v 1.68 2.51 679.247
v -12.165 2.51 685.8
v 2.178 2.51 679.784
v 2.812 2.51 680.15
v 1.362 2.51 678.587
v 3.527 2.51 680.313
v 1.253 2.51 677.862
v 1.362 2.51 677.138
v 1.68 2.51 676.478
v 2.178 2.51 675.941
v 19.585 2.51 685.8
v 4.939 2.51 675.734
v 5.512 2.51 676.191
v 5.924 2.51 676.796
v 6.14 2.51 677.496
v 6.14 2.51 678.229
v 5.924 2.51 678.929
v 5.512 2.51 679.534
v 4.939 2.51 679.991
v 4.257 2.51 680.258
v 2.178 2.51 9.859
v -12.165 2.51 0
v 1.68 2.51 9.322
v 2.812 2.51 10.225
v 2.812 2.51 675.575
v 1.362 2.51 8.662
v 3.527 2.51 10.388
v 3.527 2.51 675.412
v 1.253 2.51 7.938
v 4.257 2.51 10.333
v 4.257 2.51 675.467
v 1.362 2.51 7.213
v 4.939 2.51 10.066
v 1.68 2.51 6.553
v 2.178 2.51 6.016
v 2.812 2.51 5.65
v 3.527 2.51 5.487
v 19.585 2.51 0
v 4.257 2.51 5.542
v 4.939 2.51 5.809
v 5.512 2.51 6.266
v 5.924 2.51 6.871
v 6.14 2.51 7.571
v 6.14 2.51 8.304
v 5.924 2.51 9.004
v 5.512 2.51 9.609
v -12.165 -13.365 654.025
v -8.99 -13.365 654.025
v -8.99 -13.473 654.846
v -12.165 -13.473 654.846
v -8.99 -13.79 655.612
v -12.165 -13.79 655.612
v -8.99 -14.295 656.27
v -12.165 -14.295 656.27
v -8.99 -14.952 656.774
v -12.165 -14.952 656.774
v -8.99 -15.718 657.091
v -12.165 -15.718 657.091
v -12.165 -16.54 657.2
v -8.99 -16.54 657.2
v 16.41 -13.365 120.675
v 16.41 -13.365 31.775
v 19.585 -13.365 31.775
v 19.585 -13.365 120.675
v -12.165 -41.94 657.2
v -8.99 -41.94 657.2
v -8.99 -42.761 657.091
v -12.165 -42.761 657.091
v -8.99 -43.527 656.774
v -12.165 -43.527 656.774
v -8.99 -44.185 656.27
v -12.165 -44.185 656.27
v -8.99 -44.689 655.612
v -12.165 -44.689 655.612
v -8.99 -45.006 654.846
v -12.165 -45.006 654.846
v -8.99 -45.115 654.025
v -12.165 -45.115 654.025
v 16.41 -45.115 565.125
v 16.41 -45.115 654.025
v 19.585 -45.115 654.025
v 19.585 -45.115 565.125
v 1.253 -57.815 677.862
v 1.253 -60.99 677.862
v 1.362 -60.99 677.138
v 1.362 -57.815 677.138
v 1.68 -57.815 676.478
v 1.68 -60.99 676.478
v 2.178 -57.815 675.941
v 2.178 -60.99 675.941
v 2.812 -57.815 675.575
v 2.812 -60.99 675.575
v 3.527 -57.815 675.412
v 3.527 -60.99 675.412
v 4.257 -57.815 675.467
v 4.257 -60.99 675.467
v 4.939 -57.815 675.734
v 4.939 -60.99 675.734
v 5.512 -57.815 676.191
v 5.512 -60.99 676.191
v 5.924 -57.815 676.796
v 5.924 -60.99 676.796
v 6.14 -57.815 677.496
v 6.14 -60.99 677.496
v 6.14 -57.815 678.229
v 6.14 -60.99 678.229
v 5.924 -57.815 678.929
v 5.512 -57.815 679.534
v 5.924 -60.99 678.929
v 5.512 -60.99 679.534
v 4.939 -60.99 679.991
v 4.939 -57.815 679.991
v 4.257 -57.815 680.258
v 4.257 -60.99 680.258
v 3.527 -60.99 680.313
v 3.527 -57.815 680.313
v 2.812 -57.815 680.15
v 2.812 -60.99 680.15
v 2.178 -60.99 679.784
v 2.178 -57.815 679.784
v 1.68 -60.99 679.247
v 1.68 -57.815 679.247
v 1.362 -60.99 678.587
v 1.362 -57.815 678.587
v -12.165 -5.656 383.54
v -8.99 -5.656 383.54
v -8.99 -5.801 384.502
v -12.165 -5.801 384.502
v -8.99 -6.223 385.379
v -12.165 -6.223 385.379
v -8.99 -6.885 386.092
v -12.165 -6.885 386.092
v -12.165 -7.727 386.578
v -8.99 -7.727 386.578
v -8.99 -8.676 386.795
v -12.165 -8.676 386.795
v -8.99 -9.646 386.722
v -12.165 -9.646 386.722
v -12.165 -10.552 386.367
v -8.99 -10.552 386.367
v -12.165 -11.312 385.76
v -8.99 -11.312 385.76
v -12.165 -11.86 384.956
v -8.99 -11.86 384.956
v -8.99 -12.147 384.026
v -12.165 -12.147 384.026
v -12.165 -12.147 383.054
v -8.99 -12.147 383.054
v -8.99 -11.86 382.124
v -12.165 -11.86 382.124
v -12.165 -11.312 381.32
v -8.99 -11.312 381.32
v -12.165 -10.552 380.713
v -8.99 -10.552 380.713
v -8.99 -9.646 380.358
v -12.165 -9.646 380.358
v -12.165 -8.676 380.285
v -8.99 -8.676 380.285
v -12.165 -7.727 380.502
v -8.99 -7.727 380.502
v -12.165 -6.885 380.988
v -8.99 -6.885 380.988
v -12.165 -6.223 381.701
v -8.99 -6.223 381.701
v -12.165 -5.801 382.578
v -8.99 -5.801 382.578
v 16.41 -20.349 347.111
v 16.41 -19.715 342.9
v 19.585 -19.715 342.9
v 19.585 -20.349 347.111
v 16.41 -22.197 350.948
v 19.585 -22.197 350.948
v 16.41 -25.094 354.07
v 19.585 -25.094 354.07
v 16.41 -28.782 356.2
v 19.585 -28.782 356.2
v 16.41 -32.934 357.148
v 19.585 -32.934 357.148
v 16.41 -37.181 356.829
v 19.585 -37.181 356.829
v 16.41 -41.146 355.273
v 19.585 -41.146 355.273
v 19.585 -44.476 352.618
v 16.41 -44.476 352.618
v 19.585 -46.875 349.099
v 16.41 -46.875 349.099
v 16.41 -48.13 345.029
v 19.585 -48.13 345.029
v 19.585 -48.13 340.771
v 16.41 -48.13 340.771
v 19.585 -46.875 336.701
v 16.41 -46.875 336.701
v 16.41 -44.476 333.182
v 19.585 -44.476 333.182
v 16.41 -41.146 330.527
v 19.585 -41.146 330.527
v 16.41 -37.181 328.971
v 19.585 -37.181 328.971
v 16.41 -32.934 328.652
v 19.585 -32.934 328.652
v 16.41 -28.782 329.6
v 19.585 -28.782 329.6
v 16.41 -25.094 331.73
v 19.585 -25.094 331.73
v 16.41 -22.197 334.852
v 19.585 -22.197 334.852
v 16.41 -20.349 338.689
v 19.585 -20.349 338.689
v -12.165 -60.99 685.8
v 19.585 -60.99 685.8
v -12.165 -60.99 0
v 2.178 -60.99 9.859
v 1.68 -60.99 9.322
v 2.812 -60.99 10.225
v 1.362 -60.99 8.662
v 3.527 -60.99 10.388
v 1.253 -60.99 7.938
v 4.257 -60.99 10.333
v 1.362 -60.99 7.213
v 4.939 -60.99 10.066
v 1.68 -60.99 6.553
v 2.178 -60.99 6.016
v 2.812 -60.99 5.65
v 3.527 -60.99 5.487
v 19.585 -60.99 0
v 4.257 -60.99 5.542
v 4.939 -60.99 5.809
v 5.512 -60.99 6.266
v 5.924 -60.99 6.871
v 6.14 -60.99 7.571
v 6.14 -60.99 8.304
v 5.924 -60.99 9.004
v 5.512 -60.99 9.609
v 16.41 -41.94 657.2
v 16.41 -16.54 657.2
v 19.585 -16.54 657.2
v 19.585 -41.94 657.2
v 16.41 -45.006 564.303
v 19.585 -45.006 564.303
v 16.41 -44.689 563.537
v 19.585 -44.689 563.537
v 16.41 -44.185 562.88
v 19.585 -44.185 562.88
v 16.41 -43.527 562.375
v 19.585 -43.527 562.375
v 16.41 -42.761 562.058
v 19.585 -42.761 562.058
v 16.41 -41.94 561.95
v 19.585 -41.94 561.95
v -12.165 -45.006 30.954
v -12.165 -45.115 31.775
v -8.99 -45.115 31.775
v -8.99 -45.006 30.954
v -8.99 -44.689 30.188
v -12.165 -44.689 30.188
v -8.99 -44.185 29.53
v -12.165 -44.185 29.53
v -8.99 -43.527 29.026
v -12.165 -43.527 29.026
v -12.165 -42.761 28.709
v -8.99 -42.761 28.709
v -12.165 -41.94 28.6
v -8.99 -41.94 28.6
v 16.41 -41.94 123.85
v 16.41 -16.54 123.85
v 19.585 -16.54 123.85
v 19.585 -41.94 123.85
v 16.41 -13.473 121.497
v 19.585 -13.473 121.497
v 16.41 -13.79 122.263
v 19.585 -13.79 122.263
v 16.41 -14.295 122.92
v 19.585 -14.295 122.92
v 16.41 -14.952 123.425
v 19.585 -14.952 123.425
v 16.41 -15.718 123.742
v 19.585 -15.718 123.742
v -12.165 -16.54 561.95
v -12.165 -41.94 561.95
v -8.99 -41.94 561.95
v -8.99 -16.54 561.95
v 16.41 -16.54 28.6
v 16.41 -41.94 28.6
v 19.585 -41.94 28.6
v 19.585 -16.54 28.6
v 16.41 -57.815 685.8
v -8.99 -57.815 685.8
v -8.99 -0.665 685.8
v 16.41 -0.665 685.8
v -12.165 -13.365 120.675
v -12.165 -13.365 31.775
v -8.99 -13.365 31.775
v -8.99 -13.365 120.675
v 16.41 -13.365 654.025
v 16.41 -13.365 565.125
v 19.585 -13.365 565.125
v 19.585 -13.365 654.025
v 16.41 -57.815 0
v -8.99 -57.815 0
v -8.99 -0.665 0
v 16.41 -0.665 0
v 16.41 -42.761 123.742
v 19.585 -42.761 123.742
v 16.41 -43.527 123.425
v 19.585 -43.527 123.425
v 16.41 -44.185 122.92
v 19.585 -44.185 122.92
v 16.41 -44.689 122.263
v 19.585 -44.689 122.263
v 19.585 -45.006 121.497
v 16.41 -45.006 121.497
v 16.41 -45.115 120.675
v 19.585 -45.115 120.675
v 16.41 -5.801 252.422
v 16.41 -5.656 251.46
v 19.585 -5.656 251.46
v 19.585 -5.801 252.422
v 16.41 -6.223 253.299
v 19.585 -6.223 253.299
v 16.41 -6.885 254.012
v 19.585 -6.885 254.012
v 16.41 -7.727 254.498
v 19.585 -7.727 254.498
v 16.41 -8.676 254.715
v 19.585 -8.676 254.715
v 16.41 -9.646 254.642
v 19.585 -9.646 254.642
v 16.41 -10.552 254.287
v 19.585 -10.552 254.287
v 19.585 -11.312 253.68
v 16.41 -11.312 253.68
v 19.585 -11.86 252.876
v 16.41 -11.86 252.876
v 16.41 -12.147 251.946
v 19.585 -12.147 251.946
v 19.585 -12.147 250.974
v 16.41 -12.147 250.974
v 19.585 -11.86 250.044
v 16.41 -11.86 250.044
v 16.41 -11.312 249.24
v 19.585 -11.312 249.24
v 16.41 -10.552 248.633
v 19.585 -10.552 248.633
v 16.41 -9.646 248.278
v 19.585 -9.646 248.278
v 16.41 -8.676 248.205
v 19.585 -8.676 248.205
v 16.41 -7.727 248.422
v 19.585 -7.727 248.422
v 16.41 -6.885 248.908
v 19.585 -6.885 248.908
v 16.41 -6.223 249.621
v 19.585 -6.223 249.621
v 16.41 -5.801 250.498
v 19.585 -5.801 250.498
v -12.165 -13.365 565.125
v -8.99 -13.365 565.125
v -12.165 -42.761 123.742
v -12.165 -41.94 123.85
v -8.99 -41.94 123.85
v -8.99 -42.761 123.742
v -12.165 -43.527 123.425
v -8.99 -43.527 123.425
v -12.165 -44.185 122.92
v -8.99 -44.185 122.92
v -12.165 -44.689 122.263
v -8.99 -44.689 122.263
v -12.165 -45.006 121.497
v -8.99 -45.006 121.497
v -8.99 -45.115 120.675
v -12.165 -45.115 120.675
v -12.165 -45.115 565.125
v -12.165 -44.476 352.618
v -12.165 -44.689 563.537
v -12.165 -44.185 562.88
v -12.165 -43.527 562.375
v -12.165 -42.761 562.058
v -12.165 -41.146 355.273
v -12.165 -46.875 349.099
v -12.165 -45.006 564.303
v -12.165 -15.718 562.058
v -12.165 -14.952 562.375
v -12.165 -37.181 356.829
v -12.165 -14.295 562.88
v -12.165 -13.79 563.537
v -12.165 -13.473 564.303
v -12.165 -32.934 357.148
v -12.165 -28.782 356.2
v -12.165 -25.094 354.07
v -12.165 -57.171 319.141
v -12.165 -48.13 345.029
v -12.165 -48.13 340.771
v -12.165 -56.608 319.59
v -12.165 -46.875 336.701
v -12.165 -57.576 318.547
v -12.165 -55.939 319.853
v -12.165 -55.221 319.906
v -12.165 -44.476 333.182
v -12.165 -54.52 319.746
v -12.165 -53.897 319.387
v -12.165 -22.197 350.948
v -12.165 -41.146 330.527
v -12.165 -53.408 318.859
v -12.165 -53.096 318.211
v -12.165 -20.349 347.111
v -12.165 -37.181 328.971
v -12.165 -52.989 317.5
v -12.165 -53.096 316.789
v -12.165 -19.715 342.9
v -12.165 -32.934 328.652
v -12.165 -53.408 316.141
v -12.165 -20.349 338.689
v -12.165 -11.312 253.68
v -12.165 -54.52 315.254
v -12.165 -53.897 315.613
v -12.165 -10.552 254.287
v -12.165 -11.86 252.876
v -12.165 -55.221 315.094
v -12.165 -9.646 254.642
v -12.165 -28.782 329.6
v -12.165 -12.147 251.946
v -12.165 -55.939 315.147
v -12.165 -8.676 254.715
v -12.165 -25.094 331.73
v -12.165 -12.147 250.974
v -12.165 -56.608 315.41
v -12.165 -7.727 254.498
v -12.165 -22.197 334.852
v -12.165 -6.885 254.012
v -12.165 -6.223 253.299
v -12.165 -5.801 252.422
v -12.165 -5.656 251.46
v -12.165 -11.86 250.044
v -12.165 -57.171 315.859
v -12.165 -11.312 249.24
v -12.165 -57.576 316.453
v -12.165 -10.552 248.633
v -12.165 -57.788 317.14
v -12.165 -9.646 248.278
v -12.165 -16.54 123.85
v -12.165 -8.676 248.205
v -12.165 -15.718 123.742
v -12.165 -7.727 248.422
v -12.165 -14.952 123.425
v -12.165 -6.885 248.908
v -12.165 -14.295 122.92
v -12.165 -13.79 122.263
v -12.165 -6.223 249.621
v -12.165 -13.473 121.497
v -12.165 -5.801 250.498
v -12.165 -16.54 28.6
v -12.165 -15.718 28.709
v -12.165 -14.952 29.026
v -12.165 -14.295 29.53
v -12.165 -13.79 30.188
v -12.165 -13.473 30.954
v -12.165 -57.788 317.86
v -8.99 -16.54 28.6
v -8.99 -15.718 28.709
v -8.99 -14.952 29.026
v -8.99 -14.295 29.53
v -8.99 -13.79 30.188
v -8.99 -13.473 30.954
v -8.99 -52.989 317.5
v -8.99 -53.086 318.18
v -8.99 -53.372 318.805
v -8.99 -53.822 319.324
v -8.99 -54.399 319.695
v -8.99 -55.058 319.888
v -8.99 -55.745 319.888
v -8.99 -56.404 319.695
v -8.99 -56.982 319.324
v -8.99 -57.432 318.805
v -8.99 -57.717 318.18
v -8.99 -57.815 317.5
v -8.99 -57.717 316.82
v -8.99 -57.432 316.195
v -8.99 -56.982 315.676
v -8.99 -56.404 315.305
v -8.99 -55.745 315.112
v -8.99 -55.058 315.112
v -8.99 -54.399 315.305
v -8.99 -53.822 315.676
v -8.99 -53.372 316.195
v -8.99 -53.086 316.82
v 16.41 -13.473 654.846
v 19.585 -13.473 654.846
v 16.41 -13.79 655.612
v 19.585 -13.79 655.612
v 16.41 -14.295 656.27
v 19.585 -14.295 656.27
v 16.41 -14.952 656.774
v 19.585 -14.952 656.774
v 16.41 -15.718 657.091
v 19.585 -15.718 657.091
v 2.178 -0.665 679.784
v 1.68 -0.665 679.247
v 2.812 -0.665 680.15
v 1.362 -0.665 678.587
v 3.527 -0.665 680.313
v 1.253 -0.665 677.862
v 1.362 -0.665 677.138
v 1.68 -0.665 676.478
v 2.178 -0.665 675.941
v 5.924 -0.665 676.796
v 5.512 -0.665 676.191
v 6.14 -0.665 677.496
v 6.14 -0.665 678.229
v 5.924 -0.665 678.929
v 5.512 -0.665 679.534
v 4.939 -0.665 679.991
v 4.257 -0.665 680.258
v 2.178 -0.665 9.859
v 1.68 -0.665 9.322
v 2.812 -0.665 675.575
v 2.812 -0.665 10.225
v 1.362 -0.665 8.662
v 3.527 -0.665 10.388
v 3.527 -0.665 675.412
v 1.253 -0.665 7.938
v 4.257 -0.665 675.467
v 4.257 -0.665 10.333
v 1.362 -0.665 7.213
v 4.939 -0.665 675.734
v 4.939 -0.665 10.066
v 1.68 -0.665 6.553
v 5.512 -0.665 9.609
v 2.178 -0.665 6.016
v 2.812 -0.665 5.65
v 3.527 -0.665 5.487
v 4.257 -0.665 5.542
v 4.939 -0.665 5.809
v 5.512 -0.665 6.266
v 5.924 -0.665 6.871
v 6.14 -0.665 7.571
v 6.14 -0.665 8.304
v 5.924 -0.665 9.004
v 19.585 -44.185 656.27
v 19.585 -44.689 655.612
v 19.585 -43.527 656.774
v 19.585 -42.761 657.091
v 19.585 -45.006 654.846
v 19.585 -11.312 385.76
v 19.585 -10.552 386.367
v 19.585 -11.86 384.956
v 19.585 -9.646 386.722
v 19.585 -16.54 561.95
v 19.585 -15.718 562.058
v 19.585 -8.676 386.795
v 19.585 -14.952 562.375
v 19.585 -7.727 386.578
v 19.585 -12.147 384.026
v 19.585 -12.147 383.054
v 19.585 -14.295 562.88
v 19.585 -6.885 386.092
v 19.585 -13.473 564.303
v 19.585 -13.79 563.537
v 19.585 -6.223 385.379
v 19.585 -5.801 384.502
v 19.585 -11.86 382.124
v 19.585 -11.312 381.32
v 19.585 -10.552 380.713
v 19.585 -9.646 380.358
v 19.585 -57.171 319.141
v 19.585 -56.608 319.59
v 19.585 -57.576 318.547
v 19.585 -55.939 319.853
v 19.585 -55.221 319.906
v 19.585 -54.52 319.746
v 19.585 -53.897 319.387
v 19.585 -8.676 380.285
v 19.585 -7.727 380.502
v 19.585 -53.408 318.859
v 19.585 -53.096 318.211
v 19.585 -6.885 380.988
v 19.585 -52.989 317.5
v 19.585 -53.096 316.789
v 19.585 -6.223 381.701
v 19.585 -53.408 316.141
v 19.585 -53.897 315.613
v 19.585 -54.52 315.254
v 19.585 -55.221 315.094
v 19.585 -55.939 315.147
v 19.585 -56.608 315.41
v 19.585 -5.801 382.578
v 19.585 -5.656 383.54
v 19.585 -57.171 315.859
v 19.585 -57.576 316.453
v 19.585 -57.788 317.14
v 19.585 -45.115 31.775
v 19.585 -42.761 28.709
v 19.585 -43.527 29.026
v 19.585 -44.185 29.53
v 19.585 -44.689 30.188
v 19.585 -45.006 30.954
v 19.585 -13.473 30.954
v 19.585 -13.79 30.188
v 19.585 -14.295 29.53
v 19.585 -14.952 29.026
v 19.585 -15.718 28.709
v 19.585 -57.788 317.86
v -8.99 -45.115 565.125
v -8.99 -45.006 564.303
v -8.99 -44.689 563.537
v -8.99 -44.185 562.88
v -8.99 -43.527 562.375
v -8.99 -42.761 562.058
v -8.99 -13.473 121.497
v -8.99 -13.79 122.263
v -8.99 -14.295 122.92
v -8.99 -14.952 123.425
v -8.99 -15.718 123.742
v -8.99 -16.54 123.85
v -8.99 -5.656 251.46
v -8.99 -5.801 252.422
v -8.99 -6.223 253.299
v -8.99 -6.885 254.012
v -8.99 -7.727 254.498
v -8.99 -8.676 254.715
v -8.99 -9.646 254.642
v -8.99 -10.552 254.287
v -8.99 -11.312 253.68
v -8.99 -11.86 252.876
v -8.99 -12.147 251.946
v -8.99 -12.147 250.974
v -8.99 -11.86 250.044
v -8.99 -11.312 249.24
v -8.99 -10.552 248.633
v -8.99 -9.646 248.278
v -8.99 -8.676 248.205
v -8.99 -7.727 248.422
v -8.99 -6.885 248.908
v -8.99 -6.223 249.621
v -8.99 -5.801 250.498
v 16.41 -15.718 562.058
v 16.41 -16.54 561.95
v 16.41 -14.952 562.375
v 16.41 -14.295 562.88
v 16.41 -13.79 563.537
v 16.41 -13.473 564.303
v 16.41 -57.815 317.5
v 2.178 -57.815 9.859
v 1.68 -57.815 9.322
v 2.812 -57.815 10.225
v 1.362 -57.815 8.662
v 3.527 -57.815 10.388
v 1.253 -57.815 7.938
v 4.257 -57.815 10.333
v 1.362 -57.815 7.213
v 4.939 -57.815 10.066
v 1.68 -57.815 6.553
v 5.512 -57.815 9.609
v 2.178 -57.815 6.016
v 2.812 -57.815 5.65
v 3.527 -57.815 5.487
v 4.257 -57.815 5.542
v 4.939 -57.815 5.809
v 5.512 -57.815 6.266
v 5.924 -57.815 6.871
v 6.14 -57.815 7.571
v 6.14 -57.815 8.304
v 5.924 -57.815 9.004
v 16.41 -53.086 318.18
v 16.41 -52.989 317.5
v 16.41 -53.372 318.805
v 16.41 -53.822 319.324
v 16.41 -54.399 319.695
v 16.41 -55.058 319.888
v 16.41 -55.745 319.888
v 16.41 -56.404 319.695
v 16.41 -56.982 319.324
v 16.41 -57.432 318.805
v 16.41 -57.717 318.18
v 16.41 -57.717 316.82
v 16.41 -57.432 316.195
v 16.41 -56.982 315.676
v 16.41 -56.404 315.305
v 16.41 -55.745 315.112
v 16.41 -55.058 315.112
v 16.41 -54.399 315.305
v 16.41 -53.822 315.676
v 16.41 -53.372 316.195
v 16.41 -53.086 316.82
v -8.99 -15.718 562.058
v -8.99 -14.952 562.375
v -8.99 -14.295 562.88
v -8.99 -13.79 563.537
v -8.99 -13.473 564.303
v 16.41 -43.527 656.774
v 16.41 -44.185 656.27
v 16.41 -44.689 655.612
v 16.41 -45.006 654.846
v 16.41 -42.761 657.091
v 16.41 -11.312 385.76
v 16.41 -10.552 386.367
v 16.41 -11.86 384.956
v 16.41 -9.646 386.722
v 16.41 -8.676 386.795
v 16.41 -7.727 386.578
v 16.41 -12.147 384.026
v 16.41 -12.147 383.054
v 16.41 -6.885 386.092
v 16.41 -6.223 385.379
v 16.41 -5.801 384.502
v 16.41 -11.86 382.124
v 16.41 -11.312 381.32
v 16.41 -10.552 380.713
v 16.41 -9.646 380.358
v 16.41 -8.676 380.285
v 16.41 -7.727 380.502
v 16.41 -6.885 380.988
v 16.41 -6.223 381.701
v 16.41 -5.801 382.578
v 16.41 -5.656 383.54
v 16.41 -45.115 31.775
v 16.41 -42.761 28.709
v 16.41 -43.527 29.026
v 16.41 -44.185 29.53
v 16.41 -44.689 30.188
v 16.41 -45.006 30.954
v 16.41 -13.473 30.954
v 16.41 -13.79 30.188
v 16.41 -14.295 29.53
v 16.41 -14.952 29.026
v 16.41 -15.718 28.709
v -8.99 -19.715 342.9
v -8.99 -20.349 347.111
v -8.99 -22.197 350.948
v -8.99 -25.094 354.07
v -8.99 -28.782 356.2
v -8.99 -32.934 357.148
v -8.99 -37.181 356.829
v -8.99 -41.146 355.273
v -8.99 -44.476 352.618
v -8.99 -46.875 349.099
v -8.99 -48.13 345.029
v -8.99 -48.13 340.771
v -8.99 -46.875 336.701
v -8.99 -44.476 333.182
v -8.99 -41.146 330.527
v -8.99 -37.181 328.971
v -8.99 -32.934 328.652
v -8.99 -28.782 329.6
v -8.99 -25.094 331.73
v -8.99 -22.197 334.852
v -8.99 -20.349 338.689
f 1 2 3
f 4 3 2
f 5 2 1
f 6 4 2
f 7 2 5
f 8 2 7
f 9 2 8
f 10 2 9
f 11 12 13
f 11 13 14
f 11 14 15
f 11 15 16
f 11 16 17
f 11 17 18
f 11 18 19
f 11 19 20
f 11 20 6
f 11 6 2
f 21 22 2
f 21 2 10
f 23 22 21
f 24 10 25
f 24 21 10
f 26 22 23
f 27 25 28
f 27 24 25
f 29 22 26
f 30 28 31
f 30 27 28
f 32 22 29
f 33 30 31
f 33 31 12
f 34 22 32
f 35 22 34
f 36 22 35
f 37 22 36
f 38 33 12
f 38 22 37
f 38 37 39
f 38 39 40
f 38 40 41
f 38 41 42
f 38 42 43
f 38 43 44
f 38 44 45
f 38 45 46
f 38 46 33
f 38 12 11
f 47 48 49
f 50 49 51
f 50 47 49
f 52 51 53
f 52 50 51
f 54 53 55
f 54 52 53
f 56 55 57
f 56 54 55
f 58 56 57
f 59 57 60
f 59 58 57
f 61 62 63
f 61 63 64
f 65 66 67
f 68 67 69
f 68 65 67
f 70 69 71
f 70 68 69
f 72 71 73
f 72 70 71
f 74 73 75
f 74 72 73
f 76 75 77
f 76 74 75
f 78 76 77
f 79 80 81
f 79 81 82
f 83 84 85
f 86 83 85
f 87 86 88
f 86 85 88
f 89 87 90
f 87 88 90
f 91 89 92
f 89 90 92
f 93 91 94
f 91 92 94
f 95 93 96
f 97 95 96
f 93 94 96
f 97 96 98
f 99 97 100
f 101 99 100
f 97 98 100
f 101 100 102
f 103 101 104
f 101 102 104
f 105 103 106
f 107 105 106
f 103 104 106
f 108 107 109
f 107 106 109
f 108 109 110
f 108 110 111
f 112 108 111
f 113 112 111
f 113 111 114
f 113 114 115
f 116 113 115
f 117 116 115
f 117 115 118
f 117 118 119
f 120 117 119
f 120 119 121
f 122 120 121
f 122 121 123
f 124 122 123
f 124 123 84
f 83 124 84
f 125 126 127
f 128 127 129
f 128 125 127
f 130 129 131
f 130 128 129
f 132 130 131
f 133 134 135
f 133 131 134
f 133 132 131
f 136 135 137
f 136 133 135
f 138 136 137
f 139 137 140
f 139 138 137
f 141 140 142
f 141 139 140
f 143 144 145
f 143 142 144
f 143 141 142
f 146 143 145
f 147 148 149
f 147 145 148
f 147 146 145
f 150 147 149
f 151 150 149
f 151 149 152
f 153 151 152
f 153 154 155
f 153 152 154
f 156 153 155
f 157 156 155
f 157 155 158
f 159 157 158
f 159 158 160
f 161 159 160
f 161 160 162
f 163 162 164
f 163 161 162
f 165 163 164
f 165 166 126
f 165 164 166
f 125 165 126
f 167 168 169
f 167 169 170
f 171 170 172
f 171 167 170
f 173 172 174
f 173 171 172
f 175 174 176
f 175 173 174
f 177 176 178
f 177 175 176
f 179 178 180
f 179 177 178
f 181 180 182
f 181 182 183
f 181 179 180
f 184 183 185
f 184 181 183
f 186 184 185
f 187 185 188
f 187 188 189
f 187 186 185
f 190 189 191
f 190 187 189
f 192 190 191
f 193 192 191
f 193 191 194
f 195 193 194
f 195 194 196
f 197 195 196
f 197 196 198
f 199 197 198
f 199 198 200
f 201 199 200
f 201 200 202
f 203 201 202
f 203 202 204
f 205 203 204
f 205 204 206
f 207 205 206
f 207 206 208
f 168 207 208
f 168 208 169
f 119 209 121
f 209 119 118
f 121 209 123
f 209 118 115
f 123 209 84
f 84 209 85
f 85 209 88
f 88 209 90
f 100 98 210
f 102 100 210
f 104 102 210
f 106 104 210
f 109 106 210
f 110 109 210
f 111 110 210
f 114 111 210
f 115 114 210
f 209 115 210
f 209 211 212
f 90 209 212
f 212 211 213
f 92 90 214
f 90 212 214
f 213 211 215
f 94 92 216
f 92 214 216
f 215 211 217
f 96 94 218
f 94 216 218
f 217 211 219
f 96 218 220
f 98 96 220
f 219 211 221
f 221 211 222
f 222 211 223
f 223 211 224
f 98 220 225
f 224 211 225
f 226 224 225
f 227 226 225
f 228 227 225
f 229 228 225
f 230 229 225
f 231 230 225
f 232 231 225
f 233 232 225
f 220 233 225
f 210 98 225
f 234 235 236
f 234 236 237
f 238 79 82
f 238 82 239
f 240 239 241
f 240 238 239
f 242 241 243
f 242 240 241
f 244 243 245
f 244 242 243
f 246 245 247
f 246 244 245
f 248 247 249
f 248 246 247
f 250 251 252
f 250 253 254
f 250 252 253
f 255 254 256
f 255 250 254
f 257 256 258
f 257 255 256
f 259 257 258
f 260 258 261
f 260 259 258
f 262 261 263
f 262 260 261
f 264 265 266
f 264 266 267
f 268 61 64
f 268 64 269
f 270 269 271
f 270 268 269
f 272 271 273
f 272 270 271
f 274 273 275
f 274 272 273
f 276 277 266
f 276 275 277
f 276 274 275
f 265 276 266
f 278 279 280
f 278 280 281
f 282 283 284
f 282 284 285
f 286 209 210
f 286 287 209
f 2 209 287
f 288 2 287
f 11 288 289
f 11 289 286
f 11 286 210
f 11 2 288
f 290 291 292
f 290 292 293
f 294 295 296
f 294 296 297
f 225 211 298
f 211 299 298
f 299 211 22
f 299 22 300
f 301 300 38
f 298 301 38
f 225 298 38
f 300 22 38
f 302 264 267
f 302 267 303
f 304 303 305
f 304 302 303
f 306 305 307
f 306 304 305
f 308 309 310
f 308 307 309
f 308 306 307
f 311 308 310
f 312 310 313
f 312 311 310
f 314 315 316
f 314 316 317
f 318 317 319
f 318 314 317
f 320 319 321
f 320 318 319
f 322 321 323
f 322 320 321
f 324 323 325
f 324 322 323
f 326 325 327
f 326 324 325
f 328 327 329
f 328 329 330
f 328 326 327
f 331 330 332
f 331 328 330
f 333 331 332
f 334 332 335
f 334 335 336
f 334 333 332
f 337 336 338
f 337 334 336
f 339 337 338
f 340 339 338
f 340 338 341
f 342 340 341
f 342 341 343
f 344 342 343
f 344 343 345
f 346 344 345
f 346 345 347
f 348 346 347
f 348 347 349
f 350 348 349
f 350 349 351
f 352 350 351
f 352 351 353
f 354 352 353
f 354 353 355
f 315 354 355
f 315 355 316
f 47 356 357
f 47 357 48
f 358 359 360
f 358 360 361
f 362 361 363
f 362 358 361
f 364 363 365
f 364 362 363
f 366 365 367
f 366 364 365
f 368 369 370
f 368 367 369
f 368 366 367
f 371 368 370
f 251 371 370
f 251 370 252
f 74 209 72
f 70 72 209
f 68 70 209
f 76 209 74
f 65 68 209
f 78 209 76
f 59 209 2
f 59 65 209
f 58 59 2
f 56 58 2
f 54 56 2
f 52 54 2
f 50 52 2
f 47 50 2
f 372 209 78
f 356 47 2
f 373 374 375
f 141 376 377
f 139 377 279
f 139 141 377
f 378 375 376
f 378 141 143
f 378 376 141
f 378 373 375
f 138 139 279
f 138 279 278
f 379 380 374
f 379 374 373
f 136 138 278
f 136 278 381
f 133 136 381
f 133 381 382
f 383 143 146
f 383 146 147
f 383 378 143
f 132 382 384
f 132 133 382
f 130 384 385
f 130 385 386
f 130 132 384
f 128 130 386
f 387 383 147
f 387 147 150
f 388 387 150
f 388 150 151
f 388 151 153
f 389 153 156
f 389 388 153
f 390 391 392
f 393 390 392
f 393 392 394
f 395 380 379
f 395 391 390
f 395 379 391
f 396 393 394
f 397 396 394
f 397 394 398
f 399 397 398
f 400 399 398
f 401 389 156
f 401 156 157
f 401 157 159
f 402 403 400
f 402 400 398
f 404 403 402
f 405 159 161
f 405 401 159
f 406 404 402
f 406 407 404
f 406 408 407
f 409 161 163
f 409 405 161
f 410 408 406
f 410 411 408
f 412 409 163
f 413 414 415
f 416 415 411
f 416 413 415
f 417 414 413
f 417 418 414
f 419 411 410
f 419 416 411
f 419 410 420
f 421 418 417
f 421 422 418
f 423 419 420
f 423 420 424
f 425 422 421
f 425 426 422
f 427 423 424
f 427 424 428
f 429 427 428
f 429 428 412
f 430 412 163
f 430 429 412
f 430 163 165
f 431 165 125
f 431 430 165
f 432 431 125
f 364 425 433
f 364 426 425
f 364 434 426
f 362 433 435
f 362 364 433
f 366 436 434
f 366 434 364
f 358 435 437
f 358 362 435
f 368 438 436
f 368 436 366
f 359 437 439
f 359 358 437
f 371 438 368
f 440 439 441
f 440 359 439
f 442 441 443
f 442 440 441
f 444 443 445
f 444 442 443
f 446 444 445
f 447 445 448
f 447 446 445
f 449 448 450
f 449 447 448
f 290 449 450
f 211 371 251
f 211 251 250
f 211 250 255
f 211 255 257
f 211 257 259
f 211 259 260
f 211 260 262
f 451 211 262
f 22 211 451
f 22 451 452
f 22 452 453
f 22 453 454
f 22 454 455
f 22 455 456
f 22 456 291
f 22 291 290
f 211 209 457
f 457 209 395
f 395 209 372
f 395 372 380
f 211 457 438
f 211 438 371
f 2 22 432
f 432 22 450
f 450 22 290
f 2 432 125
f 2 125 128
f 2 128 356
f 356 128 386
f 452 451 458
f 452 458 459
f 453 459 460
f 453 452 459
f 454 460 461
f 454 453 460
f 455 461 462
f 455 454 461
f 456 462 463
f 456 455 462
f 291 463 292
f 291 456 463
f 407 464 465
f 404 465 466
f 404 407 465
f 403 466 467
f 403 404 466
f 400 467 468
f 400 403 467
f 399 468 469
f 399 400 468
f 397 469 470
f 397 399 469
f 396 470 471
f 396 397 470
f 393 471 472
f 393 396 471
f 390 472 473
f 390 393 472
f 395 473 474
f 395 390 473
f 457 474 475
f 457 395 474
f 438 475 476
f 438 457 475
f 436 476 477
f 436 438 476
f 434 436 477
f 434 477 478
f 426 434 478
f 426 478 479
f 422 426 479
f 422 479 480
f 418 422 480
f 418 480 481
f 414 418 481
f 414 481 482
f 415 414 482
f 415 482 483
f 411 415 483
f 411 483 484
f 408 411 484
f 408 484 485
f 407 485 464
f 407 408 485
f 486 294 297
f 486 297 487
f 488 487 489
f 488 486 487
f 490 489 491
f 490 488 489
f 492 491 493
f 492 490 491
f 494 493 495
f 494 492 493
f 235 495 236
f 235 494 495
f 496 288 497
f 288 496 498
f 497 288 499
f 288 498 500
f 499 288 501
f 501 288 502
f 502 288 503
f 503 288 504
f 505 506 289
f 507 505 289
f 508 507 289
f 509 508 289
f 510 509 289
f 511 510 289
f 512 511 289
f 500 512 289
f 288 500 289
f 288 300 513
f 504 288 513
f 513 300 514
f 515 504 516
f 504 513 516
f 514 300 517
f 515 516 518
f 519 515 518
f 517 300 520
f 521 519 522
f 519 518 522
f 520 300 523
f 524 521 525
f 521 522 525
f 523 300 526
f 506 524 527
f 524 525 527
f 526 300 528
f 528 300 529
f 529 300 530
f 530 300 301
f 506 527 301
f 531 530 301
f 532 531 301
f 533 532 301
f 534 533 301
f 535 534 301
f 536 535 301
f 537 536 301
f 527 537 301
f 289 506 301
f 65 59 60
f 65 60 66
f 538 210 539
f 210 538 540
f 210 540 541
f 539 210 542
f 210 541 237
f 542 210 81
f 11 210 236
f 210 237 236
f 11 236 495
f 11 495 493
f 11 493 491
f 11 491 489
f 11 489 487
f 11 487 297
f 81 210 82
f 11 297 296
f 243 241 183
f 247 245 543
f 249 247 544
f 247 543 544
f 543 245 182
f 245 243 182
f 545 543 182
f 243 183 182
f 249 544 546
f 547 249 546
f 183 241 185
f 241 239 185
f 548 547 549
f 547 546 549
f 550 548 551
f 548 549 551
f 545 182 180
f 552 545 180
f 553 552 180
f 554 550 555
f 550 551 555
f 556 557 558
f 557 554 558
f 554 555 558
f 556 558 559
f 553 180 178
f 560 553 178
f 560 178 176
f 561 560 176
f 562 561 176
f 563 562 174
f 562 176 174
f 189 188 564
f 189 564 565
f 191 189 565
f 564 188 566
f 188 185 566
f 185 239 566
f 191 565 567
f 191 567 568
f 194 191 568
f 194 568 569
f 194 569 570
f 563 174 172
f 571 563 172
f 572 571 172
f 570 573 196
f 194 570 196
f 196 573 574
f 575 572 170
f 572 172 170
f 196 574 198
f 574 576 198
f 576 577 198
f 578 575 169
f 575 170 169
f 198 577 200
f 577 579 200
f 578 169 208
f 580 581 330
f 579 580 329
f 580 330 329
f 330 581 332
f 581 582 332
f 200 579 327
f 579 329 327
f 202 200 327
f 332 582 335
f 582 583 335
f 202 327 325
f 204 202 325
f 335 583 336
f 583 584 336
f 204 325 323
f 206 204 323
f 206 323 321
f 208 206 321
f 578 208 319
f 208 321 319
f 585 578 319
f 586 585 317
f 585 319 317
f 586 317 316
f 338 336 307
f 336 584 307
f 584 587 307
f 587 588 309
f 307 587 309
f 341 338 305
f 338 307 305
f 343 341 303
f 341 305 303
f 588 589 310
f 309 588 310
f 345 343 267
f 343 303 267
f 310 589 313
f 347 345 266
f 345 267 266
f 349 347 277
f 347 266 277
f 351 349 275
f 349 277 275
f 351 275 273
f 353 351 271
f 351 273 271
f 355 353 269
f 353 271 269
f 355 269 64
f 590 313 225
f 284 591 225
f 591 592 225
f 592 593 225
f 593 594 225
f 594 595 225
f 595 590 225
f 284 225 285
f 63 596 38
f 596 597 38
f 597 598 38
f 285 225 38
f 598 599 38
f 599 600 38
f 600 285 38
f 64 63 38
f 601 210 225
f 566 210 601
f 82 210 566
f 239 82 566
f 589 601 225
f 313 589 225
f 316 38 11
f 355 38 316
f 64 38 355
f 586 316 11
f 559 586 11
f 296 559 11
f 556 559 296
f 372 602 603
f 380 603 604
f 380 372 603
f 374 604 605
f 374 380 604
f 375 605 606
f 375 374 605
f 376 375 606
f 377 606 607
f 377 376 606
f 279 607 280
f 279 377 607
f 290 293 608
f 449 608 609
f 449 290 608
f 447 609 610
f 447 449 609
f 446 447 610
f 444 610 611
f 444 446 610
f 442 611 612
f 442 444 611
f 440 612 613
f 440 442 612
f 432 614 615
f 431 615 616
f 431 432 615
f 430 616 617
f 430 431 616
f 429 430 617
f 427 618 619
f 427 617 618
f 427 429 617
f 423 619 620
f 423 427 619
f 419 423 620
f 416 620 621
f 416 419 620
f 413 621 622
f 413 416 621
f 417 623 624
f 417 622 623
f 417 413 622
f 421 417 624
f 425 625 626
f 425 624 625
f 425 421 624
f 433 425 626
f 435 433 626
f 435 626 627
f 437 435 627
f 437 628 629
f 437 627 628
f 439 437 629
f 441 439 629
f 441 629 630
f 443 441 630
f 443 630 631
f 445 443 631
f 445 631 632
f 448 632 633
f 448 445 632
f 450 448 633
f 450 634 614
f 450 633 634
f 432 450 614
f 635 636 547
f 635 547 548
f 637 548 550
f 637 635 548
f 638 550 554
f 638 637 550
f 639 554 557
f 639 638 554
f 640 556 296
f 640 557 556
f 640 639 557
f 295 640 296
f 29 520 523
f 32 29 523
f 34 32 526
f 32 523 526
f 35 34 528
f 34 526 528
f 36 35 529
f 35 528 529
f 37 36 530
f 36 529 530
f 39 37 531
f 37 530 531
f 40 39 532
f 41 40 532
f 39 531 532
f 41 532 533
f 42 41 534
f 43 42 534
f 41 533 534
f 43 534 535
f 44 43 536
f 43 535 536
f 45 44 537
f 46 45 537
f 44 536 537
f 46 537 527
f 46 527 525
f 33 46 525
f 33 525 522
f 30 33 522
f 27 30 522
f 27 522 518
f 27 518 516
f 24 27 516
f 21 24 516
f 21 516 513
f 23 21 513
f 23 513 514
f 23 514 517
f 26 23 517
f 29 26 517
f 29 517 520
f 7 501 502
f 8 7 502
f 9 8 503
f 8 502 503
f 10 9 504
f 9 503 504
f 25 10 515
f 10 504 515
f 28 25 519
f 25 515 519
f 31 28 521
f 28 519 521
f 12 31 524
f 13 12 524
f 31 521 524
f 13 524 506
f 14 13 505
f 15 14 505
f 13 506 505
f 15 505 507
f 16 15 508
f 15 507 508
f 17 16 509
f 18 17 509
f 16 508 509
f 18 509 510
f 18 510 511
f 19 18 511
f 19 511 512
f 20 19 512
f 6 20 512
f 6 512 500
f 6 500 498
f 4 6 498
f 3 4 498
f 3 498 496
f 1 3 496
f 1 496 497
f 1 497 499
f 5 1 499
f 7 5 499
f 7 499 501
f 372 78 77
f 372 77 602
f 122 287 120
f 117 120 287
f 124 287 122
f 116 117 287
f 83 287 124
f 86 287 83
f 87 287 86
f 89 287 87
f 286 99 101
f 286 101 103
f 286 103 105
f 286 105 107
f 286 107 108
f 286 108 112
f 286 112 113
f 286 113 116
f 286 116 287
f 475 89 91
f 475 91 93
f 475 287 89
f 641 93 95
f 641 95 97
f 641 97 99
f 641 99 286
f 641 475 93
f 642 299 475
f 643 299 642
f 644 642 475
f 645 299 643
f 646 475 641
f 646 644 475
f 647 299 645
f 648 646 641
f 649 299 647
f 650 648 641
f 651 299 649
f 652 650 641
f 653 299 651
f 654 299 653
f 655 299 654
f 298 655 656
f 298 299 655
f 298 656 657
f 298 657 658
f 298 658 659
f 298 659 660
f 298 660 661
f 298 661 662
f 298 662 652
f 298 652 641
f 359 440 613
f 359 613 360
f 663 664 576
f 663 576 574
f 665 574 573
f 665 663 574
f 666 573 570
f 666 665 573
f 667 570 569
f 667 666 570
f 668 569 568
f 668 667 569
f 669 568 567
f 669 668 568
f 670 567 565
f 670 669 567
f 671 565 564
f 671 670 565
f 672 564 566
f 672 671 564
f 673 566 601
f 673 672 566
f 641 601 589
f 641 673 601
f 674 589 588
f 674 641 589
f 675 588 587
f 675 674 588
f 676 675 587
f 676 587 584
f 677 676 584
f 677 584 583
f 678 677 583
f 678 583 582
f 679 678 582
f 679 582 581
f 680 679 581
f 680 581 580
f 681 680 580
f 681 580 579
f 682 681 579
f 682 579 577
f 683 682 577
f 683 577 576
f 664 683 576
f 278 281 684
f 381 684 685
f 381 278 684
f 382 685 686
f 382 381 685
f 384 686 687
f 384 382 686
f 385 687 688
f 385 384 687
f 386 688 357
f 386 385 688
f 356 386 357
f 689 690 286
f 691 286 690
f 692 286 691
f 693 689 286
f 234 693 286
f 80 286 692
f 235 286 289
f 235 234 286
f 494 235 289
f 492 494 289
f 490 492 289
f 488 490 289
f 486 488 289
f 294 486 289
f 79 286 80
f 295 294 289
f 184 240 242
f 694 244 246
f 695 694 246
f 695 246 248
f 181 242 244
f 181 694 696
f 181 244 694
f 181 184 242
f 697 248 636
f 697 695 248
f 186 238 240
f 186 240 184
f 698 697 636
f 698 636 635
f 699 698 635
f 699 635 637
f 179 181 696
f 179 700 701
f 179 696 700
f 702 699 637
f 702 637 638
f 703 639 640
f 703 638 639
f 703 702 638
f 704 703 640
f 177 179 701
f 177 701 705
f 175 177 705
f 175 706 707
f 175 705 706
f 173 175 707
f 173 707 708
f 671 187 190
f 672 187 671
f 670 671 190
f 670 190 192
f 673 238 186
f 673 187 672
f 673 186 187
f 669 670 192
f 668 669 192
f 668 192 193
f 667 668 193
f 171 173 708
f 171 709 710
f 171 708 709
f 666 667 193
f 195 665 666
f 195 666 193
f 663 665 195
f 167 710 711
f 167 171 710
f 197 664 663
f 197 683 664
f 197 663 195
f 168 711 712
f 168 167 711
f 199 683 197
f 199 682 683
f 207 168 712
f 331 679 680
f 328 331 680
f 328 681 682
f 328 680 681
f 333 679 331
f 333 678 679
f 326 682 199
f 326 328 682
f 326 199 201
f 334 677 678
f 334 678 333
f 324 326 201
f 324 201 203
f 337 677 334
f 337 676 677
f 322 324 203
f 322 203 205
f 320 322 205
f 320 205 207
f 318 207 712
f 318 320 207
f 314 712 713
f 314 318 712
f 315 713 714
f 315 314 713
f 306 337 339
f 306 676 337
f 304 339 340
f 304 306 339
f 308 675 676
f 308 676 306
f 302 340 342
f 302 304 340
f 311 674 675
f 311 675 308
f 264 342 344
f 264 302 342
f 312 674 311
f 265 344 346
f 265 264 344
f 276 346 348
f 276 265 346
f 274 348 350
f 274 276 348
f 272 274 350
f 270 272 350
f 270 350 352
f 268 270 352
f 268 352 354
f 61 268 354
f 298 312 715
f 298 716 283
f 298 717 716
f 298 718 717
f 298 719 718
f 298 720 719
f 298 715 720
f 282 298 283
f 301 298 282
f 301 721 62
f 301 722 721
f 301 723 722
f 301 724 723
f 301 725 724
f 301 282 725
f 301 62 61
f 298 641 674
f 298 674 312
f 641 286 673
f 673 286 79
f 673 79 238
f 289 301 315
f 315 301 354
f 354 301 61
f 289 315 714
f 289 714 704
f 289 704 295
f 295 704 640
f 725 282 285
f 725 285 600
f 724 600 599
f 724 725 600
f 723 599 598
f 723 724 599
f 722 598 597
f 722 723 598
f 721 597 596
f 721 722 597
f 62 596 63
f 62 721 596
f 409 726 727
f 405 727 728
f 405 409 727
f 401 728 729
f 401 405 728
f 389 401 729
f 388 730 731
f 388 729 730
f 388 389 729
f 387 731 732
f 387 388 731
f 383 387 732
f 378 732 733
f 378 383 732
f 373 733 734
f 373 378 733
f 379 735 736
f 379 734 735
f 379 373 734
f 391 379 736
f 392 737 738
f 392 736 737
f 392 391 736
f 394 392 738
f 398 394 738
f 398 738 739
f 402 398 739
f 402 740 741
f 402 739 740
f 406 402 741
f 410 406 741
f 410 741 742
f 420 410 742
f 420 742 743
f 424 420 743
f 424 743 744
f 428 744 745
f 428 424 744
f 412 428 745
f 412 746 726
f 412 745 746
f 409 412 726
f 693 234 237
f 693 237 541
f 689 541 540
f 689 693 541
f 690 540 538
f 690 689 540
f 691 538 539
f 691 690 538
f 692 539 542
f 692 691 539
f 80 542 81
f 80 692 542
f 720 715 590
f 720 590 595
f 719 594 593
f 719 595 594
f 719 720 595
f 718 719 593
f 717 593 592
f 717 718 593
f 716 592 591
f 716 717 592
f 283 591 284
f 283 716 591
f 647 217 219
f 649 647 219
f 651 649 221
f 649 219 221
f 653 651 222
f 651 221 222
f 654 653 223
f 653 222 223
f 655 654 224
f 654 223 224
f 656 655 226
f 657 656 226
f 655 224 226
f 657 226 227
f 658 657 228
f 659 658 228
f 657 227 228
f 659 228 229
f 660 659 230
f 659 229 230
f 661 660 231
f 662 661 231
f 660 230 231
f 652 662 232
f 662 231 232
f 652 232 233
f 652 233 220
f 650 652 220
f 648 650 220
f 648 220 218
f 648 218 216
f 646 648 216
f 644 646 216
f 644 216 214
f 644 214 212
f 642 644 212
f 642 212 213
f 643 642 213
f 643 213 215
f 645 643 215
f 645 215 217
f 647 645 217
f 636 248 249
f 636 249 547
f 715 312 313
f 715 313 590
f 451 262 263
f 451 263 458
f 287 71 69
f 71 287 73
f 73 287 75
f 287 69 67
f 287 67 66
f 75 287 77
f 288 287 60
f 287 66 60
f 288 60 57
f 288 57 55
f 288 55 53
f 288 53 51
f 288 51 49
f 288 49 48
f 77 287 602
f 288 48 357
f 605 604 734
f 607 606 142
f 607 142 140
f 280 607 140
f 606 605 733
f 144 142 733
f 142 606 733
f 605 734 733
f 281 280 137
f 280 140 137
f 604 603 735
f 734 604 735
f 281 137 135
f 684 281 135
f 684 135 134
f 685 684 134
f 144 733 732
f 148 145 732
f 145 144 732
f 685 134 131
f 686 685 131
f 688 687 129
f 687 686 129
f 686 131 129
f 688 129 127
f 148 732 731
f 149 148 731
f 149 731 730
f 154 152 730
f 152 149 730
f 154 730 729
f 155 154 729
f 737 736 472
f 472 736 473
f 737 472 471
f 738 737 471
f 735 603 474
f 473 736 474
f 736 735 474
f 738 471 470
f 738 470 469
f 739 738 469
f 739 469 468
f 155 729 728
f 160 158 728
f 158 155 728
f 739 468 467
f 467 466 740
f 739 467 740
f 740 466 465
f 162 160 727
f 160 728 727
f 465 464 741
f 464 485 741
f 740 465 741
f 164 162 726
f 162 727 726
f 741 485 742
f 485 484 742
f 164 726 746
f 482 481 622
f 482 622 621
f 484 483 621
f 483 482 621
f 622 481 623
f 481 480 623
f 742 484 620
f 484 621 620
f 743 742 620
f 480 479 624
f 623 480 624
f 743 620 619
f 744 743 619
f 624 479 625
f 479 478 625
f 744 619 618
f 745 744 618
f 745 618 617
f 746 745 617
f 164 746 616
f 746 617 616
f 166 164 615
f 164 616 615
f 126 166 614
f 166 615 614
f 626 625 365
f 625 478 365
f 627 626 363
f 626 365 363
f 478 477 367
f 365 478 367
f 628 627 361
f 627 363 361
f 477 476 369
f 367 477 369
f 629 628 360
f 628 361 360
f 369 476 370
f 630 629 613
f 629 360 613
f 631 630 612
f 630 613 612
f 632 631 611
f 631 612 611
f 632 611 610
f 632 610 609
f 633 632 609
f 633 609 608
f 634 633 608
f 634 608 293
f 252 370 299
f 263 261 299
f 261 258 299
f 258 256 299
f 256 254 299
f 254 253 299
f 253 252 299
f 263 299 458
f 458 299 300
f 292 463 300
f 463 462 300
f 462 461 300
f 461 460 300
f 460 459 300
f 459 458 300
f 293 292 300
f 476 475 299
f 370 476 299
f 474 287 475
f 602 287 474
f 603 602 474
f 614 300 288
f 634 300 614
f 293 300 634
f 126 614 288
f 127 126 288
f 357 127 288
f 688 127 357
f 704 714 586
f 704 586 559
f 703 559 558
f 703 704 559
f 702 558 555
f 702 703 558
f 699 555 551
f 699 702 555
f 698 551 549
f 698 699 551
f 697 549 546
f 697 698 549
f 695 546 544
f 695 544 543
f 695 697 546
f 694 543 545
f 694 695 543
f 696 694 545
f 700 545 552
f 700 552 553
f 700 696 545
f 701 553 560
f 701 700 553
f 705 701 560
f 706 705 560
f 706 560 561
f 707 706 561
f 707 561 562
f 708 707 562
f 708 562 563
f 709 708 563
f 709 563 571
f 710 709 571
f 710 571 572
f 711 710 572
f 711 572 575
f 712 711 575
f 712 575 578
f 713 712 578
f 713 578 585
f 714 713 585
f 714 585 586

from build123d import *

# Parameters (mm, degrees)
SKETCH1_W                    = 31.75
SKETCH1_H                    = 63.5
SKETCH1_W_2                  = 25.4
SKETCH1_H_2                  = 57.15
BOSS_EXTRUDE1_DEPTH          = 685.8
CUT_EXTRUDE1_REACH           = 691.238
F_10_0_1935_DIAMETER_HOLE1_D = 4.9149
CUT_EXTRUDE2_START           = -31.75
SKETCH6_R                    = 14.2875
SKETCH6_R_2                  = 3.2639
SKETCH6_R_3                  = 2.413
CUT_EXTRUDE2_DEPTH           = 31.75


with BuildPart() as part:
    # Sketch1 → Boss-Extrude1 (new body)
    with BuildSketch(Plane.XY):
        with Locations((3.710272719, -29.23968021)):
            Rectangle(SKETCH1_W, SKETCH1_H)
        with Locations((3.710272719, -29.23968021)):
            Rectangle(SKETCH1_W_2, SKETCH1_H_2, mode=Mode.SUBTRACT)
    extrude(amount=BOSS_EXTRUDE1_DEPTH)

    # Cut-Extrude1: up to this face of the body (flat: up to its plane)
    cut_extrude1_end = Plane(part.part.faces().sort_by_distance((19.585272719, -29.23968021, 342.9))[0])
    # Sketch3 → Cut-Extrude1 (cut, up to the picked face)
    with BuildSketch(Plane.ZY.offset(12.164727281), mode=Mode.PRIVATE) as cut_extrude1_sk1:
        with BuildLine():
            Line((31.7754, -13.36468021), (120.6754, -13.36468021))
            ThreePointArc((120.6754, -13.36468021), (122.92046403, -14.294616179), (123.8504, -16.53968021))
            Line((123.8504, -16.53968021), (123.8504, -41.93968021))
            ThreePointArc((123.8504, -41.93968021), (122.92046403, -44.18474424), (120.6754, -45.11468021))
            Line((120.6754, -45.11468021), (31.7754, -45.11468021))
            ThreePointArc((31.7754, -45.11468021), (29.53033597, -44.18474424), (28.6004, -41.93968021))
            Line((28.6004, -41.93968021), (28.6004, -16.53968021))
            ThreePointArc((28.6004, -16.53968021), (29.53033597, -14.294616179), (31.7754, -13.36468021))
        make_face()
    cut_extrude1_tool1 = split(extrude(cut_extrude1_sk1.sketch, amount=-CUT_EXTRUDE1_REACH, mode=Mode.PRIVATE), bisect_by=cut_extrude1_end, keep=Keep.BOTH, mode=Mode.PRIVATE)
    # Sketch3 → Cut-Extrude1 (cut, up to the picked face)
    with BuildSketch(Plane.ZY.offset(12.164727281), mode=Mode.PRIVATE) as cut_extrude1_sk2:
        with BuildLine():
            ThreePointArc((657.1996, -41.93968021), (656.26966403, -44.18474424), (654.0246, -45.11468021))
            Line((654.0246, -45.11468021), (565.1246, -45.11468021))
            ThreePointArc((565.1246, -45.11468021), (562.87953597, -44.18474424), (561.9496, -41.93968021))
            Line((561.9496, -41.93968021), (561.9496, -16.53968021))
            ThreePointArc((561.9496, -16.53968021), (562.87953597, -14.294616179), (565.1246, -13.36468021))
            Line((565.1246, -13.36468021), (654.0246, -13.36468021))
            ThreePointArc((654.0246, -13.36468021), (656.26966403, -14.294616179), (657.1996, -16.53968021))
            Line((657.1996, -16.53968021), (657.1996, -41.93968021))
        make_face()
    cut_extrude1_tool2 = split(extrude(cut_extrude1_sk2.sketch, amount=-CUT_EXTRUDE1_REACH, mode=Mode.PRIVATE), bisect_by=cut_extrude1_end, keep=Keep.BOTH, mode=Mode.PRIVATE)
    add(cut_extrude1_tool1.solids().sort_by(Axis((-12.164727, -29.23968, 76.2254), (1, 0, 0)))[0], mode=Mode.SUBTRACT)
    add(cut_extrude1_tool2.solids().sort_by(Axis((-12.164727, -29.23968, 609.5746), (1, 0, 0)))[0], mode=Mode.SUBTRACT)

    # #10 (0.1935) Diameter Hole1 (through all)
    with Locations(Plane(origin=(3.710272719, 2.51031979, 677.8625), x_dir=(1, 0, 0), z_dir=(0, 1, 0))):
        with Locations((0, 0), (0, 669.925)):
            Hole(F_10_0_1935_DIAMETER_HOLE1_D / 2)

    # Sketch6 → Cut-Extrude2 (cut)
    with BuildSketch(Plane(origin=(19.585272719, 0, 0), x_dir=(0, 0, -1), z_dir=(1, 0, 0)).offset(CUT_EXTRUDE2_START)):
        with Locations(Location((-342.9, -34.00218021, 0), (0, 0, 90))):
            Circle(SKETCH6_R)
        with Locations(Location((-383.54, -8.91968021, 0), (0, 0, 90))):
            Circle(SKETCH6_R_2)
        with Locations(Location((-251.46, -8.91968021, 0), (0, 0, 90))):
            Circle(SKETCH6_R_2)
        with Locations(Location((-317.5, -55.40168021, 0), (0, 0, 90))):
            Circle(SKETCH6_R_3)
    extrude(amount=CUT_EXTRUDE2_DEPTH, mode=Mode.SUBTRACT)


solid = part.part
